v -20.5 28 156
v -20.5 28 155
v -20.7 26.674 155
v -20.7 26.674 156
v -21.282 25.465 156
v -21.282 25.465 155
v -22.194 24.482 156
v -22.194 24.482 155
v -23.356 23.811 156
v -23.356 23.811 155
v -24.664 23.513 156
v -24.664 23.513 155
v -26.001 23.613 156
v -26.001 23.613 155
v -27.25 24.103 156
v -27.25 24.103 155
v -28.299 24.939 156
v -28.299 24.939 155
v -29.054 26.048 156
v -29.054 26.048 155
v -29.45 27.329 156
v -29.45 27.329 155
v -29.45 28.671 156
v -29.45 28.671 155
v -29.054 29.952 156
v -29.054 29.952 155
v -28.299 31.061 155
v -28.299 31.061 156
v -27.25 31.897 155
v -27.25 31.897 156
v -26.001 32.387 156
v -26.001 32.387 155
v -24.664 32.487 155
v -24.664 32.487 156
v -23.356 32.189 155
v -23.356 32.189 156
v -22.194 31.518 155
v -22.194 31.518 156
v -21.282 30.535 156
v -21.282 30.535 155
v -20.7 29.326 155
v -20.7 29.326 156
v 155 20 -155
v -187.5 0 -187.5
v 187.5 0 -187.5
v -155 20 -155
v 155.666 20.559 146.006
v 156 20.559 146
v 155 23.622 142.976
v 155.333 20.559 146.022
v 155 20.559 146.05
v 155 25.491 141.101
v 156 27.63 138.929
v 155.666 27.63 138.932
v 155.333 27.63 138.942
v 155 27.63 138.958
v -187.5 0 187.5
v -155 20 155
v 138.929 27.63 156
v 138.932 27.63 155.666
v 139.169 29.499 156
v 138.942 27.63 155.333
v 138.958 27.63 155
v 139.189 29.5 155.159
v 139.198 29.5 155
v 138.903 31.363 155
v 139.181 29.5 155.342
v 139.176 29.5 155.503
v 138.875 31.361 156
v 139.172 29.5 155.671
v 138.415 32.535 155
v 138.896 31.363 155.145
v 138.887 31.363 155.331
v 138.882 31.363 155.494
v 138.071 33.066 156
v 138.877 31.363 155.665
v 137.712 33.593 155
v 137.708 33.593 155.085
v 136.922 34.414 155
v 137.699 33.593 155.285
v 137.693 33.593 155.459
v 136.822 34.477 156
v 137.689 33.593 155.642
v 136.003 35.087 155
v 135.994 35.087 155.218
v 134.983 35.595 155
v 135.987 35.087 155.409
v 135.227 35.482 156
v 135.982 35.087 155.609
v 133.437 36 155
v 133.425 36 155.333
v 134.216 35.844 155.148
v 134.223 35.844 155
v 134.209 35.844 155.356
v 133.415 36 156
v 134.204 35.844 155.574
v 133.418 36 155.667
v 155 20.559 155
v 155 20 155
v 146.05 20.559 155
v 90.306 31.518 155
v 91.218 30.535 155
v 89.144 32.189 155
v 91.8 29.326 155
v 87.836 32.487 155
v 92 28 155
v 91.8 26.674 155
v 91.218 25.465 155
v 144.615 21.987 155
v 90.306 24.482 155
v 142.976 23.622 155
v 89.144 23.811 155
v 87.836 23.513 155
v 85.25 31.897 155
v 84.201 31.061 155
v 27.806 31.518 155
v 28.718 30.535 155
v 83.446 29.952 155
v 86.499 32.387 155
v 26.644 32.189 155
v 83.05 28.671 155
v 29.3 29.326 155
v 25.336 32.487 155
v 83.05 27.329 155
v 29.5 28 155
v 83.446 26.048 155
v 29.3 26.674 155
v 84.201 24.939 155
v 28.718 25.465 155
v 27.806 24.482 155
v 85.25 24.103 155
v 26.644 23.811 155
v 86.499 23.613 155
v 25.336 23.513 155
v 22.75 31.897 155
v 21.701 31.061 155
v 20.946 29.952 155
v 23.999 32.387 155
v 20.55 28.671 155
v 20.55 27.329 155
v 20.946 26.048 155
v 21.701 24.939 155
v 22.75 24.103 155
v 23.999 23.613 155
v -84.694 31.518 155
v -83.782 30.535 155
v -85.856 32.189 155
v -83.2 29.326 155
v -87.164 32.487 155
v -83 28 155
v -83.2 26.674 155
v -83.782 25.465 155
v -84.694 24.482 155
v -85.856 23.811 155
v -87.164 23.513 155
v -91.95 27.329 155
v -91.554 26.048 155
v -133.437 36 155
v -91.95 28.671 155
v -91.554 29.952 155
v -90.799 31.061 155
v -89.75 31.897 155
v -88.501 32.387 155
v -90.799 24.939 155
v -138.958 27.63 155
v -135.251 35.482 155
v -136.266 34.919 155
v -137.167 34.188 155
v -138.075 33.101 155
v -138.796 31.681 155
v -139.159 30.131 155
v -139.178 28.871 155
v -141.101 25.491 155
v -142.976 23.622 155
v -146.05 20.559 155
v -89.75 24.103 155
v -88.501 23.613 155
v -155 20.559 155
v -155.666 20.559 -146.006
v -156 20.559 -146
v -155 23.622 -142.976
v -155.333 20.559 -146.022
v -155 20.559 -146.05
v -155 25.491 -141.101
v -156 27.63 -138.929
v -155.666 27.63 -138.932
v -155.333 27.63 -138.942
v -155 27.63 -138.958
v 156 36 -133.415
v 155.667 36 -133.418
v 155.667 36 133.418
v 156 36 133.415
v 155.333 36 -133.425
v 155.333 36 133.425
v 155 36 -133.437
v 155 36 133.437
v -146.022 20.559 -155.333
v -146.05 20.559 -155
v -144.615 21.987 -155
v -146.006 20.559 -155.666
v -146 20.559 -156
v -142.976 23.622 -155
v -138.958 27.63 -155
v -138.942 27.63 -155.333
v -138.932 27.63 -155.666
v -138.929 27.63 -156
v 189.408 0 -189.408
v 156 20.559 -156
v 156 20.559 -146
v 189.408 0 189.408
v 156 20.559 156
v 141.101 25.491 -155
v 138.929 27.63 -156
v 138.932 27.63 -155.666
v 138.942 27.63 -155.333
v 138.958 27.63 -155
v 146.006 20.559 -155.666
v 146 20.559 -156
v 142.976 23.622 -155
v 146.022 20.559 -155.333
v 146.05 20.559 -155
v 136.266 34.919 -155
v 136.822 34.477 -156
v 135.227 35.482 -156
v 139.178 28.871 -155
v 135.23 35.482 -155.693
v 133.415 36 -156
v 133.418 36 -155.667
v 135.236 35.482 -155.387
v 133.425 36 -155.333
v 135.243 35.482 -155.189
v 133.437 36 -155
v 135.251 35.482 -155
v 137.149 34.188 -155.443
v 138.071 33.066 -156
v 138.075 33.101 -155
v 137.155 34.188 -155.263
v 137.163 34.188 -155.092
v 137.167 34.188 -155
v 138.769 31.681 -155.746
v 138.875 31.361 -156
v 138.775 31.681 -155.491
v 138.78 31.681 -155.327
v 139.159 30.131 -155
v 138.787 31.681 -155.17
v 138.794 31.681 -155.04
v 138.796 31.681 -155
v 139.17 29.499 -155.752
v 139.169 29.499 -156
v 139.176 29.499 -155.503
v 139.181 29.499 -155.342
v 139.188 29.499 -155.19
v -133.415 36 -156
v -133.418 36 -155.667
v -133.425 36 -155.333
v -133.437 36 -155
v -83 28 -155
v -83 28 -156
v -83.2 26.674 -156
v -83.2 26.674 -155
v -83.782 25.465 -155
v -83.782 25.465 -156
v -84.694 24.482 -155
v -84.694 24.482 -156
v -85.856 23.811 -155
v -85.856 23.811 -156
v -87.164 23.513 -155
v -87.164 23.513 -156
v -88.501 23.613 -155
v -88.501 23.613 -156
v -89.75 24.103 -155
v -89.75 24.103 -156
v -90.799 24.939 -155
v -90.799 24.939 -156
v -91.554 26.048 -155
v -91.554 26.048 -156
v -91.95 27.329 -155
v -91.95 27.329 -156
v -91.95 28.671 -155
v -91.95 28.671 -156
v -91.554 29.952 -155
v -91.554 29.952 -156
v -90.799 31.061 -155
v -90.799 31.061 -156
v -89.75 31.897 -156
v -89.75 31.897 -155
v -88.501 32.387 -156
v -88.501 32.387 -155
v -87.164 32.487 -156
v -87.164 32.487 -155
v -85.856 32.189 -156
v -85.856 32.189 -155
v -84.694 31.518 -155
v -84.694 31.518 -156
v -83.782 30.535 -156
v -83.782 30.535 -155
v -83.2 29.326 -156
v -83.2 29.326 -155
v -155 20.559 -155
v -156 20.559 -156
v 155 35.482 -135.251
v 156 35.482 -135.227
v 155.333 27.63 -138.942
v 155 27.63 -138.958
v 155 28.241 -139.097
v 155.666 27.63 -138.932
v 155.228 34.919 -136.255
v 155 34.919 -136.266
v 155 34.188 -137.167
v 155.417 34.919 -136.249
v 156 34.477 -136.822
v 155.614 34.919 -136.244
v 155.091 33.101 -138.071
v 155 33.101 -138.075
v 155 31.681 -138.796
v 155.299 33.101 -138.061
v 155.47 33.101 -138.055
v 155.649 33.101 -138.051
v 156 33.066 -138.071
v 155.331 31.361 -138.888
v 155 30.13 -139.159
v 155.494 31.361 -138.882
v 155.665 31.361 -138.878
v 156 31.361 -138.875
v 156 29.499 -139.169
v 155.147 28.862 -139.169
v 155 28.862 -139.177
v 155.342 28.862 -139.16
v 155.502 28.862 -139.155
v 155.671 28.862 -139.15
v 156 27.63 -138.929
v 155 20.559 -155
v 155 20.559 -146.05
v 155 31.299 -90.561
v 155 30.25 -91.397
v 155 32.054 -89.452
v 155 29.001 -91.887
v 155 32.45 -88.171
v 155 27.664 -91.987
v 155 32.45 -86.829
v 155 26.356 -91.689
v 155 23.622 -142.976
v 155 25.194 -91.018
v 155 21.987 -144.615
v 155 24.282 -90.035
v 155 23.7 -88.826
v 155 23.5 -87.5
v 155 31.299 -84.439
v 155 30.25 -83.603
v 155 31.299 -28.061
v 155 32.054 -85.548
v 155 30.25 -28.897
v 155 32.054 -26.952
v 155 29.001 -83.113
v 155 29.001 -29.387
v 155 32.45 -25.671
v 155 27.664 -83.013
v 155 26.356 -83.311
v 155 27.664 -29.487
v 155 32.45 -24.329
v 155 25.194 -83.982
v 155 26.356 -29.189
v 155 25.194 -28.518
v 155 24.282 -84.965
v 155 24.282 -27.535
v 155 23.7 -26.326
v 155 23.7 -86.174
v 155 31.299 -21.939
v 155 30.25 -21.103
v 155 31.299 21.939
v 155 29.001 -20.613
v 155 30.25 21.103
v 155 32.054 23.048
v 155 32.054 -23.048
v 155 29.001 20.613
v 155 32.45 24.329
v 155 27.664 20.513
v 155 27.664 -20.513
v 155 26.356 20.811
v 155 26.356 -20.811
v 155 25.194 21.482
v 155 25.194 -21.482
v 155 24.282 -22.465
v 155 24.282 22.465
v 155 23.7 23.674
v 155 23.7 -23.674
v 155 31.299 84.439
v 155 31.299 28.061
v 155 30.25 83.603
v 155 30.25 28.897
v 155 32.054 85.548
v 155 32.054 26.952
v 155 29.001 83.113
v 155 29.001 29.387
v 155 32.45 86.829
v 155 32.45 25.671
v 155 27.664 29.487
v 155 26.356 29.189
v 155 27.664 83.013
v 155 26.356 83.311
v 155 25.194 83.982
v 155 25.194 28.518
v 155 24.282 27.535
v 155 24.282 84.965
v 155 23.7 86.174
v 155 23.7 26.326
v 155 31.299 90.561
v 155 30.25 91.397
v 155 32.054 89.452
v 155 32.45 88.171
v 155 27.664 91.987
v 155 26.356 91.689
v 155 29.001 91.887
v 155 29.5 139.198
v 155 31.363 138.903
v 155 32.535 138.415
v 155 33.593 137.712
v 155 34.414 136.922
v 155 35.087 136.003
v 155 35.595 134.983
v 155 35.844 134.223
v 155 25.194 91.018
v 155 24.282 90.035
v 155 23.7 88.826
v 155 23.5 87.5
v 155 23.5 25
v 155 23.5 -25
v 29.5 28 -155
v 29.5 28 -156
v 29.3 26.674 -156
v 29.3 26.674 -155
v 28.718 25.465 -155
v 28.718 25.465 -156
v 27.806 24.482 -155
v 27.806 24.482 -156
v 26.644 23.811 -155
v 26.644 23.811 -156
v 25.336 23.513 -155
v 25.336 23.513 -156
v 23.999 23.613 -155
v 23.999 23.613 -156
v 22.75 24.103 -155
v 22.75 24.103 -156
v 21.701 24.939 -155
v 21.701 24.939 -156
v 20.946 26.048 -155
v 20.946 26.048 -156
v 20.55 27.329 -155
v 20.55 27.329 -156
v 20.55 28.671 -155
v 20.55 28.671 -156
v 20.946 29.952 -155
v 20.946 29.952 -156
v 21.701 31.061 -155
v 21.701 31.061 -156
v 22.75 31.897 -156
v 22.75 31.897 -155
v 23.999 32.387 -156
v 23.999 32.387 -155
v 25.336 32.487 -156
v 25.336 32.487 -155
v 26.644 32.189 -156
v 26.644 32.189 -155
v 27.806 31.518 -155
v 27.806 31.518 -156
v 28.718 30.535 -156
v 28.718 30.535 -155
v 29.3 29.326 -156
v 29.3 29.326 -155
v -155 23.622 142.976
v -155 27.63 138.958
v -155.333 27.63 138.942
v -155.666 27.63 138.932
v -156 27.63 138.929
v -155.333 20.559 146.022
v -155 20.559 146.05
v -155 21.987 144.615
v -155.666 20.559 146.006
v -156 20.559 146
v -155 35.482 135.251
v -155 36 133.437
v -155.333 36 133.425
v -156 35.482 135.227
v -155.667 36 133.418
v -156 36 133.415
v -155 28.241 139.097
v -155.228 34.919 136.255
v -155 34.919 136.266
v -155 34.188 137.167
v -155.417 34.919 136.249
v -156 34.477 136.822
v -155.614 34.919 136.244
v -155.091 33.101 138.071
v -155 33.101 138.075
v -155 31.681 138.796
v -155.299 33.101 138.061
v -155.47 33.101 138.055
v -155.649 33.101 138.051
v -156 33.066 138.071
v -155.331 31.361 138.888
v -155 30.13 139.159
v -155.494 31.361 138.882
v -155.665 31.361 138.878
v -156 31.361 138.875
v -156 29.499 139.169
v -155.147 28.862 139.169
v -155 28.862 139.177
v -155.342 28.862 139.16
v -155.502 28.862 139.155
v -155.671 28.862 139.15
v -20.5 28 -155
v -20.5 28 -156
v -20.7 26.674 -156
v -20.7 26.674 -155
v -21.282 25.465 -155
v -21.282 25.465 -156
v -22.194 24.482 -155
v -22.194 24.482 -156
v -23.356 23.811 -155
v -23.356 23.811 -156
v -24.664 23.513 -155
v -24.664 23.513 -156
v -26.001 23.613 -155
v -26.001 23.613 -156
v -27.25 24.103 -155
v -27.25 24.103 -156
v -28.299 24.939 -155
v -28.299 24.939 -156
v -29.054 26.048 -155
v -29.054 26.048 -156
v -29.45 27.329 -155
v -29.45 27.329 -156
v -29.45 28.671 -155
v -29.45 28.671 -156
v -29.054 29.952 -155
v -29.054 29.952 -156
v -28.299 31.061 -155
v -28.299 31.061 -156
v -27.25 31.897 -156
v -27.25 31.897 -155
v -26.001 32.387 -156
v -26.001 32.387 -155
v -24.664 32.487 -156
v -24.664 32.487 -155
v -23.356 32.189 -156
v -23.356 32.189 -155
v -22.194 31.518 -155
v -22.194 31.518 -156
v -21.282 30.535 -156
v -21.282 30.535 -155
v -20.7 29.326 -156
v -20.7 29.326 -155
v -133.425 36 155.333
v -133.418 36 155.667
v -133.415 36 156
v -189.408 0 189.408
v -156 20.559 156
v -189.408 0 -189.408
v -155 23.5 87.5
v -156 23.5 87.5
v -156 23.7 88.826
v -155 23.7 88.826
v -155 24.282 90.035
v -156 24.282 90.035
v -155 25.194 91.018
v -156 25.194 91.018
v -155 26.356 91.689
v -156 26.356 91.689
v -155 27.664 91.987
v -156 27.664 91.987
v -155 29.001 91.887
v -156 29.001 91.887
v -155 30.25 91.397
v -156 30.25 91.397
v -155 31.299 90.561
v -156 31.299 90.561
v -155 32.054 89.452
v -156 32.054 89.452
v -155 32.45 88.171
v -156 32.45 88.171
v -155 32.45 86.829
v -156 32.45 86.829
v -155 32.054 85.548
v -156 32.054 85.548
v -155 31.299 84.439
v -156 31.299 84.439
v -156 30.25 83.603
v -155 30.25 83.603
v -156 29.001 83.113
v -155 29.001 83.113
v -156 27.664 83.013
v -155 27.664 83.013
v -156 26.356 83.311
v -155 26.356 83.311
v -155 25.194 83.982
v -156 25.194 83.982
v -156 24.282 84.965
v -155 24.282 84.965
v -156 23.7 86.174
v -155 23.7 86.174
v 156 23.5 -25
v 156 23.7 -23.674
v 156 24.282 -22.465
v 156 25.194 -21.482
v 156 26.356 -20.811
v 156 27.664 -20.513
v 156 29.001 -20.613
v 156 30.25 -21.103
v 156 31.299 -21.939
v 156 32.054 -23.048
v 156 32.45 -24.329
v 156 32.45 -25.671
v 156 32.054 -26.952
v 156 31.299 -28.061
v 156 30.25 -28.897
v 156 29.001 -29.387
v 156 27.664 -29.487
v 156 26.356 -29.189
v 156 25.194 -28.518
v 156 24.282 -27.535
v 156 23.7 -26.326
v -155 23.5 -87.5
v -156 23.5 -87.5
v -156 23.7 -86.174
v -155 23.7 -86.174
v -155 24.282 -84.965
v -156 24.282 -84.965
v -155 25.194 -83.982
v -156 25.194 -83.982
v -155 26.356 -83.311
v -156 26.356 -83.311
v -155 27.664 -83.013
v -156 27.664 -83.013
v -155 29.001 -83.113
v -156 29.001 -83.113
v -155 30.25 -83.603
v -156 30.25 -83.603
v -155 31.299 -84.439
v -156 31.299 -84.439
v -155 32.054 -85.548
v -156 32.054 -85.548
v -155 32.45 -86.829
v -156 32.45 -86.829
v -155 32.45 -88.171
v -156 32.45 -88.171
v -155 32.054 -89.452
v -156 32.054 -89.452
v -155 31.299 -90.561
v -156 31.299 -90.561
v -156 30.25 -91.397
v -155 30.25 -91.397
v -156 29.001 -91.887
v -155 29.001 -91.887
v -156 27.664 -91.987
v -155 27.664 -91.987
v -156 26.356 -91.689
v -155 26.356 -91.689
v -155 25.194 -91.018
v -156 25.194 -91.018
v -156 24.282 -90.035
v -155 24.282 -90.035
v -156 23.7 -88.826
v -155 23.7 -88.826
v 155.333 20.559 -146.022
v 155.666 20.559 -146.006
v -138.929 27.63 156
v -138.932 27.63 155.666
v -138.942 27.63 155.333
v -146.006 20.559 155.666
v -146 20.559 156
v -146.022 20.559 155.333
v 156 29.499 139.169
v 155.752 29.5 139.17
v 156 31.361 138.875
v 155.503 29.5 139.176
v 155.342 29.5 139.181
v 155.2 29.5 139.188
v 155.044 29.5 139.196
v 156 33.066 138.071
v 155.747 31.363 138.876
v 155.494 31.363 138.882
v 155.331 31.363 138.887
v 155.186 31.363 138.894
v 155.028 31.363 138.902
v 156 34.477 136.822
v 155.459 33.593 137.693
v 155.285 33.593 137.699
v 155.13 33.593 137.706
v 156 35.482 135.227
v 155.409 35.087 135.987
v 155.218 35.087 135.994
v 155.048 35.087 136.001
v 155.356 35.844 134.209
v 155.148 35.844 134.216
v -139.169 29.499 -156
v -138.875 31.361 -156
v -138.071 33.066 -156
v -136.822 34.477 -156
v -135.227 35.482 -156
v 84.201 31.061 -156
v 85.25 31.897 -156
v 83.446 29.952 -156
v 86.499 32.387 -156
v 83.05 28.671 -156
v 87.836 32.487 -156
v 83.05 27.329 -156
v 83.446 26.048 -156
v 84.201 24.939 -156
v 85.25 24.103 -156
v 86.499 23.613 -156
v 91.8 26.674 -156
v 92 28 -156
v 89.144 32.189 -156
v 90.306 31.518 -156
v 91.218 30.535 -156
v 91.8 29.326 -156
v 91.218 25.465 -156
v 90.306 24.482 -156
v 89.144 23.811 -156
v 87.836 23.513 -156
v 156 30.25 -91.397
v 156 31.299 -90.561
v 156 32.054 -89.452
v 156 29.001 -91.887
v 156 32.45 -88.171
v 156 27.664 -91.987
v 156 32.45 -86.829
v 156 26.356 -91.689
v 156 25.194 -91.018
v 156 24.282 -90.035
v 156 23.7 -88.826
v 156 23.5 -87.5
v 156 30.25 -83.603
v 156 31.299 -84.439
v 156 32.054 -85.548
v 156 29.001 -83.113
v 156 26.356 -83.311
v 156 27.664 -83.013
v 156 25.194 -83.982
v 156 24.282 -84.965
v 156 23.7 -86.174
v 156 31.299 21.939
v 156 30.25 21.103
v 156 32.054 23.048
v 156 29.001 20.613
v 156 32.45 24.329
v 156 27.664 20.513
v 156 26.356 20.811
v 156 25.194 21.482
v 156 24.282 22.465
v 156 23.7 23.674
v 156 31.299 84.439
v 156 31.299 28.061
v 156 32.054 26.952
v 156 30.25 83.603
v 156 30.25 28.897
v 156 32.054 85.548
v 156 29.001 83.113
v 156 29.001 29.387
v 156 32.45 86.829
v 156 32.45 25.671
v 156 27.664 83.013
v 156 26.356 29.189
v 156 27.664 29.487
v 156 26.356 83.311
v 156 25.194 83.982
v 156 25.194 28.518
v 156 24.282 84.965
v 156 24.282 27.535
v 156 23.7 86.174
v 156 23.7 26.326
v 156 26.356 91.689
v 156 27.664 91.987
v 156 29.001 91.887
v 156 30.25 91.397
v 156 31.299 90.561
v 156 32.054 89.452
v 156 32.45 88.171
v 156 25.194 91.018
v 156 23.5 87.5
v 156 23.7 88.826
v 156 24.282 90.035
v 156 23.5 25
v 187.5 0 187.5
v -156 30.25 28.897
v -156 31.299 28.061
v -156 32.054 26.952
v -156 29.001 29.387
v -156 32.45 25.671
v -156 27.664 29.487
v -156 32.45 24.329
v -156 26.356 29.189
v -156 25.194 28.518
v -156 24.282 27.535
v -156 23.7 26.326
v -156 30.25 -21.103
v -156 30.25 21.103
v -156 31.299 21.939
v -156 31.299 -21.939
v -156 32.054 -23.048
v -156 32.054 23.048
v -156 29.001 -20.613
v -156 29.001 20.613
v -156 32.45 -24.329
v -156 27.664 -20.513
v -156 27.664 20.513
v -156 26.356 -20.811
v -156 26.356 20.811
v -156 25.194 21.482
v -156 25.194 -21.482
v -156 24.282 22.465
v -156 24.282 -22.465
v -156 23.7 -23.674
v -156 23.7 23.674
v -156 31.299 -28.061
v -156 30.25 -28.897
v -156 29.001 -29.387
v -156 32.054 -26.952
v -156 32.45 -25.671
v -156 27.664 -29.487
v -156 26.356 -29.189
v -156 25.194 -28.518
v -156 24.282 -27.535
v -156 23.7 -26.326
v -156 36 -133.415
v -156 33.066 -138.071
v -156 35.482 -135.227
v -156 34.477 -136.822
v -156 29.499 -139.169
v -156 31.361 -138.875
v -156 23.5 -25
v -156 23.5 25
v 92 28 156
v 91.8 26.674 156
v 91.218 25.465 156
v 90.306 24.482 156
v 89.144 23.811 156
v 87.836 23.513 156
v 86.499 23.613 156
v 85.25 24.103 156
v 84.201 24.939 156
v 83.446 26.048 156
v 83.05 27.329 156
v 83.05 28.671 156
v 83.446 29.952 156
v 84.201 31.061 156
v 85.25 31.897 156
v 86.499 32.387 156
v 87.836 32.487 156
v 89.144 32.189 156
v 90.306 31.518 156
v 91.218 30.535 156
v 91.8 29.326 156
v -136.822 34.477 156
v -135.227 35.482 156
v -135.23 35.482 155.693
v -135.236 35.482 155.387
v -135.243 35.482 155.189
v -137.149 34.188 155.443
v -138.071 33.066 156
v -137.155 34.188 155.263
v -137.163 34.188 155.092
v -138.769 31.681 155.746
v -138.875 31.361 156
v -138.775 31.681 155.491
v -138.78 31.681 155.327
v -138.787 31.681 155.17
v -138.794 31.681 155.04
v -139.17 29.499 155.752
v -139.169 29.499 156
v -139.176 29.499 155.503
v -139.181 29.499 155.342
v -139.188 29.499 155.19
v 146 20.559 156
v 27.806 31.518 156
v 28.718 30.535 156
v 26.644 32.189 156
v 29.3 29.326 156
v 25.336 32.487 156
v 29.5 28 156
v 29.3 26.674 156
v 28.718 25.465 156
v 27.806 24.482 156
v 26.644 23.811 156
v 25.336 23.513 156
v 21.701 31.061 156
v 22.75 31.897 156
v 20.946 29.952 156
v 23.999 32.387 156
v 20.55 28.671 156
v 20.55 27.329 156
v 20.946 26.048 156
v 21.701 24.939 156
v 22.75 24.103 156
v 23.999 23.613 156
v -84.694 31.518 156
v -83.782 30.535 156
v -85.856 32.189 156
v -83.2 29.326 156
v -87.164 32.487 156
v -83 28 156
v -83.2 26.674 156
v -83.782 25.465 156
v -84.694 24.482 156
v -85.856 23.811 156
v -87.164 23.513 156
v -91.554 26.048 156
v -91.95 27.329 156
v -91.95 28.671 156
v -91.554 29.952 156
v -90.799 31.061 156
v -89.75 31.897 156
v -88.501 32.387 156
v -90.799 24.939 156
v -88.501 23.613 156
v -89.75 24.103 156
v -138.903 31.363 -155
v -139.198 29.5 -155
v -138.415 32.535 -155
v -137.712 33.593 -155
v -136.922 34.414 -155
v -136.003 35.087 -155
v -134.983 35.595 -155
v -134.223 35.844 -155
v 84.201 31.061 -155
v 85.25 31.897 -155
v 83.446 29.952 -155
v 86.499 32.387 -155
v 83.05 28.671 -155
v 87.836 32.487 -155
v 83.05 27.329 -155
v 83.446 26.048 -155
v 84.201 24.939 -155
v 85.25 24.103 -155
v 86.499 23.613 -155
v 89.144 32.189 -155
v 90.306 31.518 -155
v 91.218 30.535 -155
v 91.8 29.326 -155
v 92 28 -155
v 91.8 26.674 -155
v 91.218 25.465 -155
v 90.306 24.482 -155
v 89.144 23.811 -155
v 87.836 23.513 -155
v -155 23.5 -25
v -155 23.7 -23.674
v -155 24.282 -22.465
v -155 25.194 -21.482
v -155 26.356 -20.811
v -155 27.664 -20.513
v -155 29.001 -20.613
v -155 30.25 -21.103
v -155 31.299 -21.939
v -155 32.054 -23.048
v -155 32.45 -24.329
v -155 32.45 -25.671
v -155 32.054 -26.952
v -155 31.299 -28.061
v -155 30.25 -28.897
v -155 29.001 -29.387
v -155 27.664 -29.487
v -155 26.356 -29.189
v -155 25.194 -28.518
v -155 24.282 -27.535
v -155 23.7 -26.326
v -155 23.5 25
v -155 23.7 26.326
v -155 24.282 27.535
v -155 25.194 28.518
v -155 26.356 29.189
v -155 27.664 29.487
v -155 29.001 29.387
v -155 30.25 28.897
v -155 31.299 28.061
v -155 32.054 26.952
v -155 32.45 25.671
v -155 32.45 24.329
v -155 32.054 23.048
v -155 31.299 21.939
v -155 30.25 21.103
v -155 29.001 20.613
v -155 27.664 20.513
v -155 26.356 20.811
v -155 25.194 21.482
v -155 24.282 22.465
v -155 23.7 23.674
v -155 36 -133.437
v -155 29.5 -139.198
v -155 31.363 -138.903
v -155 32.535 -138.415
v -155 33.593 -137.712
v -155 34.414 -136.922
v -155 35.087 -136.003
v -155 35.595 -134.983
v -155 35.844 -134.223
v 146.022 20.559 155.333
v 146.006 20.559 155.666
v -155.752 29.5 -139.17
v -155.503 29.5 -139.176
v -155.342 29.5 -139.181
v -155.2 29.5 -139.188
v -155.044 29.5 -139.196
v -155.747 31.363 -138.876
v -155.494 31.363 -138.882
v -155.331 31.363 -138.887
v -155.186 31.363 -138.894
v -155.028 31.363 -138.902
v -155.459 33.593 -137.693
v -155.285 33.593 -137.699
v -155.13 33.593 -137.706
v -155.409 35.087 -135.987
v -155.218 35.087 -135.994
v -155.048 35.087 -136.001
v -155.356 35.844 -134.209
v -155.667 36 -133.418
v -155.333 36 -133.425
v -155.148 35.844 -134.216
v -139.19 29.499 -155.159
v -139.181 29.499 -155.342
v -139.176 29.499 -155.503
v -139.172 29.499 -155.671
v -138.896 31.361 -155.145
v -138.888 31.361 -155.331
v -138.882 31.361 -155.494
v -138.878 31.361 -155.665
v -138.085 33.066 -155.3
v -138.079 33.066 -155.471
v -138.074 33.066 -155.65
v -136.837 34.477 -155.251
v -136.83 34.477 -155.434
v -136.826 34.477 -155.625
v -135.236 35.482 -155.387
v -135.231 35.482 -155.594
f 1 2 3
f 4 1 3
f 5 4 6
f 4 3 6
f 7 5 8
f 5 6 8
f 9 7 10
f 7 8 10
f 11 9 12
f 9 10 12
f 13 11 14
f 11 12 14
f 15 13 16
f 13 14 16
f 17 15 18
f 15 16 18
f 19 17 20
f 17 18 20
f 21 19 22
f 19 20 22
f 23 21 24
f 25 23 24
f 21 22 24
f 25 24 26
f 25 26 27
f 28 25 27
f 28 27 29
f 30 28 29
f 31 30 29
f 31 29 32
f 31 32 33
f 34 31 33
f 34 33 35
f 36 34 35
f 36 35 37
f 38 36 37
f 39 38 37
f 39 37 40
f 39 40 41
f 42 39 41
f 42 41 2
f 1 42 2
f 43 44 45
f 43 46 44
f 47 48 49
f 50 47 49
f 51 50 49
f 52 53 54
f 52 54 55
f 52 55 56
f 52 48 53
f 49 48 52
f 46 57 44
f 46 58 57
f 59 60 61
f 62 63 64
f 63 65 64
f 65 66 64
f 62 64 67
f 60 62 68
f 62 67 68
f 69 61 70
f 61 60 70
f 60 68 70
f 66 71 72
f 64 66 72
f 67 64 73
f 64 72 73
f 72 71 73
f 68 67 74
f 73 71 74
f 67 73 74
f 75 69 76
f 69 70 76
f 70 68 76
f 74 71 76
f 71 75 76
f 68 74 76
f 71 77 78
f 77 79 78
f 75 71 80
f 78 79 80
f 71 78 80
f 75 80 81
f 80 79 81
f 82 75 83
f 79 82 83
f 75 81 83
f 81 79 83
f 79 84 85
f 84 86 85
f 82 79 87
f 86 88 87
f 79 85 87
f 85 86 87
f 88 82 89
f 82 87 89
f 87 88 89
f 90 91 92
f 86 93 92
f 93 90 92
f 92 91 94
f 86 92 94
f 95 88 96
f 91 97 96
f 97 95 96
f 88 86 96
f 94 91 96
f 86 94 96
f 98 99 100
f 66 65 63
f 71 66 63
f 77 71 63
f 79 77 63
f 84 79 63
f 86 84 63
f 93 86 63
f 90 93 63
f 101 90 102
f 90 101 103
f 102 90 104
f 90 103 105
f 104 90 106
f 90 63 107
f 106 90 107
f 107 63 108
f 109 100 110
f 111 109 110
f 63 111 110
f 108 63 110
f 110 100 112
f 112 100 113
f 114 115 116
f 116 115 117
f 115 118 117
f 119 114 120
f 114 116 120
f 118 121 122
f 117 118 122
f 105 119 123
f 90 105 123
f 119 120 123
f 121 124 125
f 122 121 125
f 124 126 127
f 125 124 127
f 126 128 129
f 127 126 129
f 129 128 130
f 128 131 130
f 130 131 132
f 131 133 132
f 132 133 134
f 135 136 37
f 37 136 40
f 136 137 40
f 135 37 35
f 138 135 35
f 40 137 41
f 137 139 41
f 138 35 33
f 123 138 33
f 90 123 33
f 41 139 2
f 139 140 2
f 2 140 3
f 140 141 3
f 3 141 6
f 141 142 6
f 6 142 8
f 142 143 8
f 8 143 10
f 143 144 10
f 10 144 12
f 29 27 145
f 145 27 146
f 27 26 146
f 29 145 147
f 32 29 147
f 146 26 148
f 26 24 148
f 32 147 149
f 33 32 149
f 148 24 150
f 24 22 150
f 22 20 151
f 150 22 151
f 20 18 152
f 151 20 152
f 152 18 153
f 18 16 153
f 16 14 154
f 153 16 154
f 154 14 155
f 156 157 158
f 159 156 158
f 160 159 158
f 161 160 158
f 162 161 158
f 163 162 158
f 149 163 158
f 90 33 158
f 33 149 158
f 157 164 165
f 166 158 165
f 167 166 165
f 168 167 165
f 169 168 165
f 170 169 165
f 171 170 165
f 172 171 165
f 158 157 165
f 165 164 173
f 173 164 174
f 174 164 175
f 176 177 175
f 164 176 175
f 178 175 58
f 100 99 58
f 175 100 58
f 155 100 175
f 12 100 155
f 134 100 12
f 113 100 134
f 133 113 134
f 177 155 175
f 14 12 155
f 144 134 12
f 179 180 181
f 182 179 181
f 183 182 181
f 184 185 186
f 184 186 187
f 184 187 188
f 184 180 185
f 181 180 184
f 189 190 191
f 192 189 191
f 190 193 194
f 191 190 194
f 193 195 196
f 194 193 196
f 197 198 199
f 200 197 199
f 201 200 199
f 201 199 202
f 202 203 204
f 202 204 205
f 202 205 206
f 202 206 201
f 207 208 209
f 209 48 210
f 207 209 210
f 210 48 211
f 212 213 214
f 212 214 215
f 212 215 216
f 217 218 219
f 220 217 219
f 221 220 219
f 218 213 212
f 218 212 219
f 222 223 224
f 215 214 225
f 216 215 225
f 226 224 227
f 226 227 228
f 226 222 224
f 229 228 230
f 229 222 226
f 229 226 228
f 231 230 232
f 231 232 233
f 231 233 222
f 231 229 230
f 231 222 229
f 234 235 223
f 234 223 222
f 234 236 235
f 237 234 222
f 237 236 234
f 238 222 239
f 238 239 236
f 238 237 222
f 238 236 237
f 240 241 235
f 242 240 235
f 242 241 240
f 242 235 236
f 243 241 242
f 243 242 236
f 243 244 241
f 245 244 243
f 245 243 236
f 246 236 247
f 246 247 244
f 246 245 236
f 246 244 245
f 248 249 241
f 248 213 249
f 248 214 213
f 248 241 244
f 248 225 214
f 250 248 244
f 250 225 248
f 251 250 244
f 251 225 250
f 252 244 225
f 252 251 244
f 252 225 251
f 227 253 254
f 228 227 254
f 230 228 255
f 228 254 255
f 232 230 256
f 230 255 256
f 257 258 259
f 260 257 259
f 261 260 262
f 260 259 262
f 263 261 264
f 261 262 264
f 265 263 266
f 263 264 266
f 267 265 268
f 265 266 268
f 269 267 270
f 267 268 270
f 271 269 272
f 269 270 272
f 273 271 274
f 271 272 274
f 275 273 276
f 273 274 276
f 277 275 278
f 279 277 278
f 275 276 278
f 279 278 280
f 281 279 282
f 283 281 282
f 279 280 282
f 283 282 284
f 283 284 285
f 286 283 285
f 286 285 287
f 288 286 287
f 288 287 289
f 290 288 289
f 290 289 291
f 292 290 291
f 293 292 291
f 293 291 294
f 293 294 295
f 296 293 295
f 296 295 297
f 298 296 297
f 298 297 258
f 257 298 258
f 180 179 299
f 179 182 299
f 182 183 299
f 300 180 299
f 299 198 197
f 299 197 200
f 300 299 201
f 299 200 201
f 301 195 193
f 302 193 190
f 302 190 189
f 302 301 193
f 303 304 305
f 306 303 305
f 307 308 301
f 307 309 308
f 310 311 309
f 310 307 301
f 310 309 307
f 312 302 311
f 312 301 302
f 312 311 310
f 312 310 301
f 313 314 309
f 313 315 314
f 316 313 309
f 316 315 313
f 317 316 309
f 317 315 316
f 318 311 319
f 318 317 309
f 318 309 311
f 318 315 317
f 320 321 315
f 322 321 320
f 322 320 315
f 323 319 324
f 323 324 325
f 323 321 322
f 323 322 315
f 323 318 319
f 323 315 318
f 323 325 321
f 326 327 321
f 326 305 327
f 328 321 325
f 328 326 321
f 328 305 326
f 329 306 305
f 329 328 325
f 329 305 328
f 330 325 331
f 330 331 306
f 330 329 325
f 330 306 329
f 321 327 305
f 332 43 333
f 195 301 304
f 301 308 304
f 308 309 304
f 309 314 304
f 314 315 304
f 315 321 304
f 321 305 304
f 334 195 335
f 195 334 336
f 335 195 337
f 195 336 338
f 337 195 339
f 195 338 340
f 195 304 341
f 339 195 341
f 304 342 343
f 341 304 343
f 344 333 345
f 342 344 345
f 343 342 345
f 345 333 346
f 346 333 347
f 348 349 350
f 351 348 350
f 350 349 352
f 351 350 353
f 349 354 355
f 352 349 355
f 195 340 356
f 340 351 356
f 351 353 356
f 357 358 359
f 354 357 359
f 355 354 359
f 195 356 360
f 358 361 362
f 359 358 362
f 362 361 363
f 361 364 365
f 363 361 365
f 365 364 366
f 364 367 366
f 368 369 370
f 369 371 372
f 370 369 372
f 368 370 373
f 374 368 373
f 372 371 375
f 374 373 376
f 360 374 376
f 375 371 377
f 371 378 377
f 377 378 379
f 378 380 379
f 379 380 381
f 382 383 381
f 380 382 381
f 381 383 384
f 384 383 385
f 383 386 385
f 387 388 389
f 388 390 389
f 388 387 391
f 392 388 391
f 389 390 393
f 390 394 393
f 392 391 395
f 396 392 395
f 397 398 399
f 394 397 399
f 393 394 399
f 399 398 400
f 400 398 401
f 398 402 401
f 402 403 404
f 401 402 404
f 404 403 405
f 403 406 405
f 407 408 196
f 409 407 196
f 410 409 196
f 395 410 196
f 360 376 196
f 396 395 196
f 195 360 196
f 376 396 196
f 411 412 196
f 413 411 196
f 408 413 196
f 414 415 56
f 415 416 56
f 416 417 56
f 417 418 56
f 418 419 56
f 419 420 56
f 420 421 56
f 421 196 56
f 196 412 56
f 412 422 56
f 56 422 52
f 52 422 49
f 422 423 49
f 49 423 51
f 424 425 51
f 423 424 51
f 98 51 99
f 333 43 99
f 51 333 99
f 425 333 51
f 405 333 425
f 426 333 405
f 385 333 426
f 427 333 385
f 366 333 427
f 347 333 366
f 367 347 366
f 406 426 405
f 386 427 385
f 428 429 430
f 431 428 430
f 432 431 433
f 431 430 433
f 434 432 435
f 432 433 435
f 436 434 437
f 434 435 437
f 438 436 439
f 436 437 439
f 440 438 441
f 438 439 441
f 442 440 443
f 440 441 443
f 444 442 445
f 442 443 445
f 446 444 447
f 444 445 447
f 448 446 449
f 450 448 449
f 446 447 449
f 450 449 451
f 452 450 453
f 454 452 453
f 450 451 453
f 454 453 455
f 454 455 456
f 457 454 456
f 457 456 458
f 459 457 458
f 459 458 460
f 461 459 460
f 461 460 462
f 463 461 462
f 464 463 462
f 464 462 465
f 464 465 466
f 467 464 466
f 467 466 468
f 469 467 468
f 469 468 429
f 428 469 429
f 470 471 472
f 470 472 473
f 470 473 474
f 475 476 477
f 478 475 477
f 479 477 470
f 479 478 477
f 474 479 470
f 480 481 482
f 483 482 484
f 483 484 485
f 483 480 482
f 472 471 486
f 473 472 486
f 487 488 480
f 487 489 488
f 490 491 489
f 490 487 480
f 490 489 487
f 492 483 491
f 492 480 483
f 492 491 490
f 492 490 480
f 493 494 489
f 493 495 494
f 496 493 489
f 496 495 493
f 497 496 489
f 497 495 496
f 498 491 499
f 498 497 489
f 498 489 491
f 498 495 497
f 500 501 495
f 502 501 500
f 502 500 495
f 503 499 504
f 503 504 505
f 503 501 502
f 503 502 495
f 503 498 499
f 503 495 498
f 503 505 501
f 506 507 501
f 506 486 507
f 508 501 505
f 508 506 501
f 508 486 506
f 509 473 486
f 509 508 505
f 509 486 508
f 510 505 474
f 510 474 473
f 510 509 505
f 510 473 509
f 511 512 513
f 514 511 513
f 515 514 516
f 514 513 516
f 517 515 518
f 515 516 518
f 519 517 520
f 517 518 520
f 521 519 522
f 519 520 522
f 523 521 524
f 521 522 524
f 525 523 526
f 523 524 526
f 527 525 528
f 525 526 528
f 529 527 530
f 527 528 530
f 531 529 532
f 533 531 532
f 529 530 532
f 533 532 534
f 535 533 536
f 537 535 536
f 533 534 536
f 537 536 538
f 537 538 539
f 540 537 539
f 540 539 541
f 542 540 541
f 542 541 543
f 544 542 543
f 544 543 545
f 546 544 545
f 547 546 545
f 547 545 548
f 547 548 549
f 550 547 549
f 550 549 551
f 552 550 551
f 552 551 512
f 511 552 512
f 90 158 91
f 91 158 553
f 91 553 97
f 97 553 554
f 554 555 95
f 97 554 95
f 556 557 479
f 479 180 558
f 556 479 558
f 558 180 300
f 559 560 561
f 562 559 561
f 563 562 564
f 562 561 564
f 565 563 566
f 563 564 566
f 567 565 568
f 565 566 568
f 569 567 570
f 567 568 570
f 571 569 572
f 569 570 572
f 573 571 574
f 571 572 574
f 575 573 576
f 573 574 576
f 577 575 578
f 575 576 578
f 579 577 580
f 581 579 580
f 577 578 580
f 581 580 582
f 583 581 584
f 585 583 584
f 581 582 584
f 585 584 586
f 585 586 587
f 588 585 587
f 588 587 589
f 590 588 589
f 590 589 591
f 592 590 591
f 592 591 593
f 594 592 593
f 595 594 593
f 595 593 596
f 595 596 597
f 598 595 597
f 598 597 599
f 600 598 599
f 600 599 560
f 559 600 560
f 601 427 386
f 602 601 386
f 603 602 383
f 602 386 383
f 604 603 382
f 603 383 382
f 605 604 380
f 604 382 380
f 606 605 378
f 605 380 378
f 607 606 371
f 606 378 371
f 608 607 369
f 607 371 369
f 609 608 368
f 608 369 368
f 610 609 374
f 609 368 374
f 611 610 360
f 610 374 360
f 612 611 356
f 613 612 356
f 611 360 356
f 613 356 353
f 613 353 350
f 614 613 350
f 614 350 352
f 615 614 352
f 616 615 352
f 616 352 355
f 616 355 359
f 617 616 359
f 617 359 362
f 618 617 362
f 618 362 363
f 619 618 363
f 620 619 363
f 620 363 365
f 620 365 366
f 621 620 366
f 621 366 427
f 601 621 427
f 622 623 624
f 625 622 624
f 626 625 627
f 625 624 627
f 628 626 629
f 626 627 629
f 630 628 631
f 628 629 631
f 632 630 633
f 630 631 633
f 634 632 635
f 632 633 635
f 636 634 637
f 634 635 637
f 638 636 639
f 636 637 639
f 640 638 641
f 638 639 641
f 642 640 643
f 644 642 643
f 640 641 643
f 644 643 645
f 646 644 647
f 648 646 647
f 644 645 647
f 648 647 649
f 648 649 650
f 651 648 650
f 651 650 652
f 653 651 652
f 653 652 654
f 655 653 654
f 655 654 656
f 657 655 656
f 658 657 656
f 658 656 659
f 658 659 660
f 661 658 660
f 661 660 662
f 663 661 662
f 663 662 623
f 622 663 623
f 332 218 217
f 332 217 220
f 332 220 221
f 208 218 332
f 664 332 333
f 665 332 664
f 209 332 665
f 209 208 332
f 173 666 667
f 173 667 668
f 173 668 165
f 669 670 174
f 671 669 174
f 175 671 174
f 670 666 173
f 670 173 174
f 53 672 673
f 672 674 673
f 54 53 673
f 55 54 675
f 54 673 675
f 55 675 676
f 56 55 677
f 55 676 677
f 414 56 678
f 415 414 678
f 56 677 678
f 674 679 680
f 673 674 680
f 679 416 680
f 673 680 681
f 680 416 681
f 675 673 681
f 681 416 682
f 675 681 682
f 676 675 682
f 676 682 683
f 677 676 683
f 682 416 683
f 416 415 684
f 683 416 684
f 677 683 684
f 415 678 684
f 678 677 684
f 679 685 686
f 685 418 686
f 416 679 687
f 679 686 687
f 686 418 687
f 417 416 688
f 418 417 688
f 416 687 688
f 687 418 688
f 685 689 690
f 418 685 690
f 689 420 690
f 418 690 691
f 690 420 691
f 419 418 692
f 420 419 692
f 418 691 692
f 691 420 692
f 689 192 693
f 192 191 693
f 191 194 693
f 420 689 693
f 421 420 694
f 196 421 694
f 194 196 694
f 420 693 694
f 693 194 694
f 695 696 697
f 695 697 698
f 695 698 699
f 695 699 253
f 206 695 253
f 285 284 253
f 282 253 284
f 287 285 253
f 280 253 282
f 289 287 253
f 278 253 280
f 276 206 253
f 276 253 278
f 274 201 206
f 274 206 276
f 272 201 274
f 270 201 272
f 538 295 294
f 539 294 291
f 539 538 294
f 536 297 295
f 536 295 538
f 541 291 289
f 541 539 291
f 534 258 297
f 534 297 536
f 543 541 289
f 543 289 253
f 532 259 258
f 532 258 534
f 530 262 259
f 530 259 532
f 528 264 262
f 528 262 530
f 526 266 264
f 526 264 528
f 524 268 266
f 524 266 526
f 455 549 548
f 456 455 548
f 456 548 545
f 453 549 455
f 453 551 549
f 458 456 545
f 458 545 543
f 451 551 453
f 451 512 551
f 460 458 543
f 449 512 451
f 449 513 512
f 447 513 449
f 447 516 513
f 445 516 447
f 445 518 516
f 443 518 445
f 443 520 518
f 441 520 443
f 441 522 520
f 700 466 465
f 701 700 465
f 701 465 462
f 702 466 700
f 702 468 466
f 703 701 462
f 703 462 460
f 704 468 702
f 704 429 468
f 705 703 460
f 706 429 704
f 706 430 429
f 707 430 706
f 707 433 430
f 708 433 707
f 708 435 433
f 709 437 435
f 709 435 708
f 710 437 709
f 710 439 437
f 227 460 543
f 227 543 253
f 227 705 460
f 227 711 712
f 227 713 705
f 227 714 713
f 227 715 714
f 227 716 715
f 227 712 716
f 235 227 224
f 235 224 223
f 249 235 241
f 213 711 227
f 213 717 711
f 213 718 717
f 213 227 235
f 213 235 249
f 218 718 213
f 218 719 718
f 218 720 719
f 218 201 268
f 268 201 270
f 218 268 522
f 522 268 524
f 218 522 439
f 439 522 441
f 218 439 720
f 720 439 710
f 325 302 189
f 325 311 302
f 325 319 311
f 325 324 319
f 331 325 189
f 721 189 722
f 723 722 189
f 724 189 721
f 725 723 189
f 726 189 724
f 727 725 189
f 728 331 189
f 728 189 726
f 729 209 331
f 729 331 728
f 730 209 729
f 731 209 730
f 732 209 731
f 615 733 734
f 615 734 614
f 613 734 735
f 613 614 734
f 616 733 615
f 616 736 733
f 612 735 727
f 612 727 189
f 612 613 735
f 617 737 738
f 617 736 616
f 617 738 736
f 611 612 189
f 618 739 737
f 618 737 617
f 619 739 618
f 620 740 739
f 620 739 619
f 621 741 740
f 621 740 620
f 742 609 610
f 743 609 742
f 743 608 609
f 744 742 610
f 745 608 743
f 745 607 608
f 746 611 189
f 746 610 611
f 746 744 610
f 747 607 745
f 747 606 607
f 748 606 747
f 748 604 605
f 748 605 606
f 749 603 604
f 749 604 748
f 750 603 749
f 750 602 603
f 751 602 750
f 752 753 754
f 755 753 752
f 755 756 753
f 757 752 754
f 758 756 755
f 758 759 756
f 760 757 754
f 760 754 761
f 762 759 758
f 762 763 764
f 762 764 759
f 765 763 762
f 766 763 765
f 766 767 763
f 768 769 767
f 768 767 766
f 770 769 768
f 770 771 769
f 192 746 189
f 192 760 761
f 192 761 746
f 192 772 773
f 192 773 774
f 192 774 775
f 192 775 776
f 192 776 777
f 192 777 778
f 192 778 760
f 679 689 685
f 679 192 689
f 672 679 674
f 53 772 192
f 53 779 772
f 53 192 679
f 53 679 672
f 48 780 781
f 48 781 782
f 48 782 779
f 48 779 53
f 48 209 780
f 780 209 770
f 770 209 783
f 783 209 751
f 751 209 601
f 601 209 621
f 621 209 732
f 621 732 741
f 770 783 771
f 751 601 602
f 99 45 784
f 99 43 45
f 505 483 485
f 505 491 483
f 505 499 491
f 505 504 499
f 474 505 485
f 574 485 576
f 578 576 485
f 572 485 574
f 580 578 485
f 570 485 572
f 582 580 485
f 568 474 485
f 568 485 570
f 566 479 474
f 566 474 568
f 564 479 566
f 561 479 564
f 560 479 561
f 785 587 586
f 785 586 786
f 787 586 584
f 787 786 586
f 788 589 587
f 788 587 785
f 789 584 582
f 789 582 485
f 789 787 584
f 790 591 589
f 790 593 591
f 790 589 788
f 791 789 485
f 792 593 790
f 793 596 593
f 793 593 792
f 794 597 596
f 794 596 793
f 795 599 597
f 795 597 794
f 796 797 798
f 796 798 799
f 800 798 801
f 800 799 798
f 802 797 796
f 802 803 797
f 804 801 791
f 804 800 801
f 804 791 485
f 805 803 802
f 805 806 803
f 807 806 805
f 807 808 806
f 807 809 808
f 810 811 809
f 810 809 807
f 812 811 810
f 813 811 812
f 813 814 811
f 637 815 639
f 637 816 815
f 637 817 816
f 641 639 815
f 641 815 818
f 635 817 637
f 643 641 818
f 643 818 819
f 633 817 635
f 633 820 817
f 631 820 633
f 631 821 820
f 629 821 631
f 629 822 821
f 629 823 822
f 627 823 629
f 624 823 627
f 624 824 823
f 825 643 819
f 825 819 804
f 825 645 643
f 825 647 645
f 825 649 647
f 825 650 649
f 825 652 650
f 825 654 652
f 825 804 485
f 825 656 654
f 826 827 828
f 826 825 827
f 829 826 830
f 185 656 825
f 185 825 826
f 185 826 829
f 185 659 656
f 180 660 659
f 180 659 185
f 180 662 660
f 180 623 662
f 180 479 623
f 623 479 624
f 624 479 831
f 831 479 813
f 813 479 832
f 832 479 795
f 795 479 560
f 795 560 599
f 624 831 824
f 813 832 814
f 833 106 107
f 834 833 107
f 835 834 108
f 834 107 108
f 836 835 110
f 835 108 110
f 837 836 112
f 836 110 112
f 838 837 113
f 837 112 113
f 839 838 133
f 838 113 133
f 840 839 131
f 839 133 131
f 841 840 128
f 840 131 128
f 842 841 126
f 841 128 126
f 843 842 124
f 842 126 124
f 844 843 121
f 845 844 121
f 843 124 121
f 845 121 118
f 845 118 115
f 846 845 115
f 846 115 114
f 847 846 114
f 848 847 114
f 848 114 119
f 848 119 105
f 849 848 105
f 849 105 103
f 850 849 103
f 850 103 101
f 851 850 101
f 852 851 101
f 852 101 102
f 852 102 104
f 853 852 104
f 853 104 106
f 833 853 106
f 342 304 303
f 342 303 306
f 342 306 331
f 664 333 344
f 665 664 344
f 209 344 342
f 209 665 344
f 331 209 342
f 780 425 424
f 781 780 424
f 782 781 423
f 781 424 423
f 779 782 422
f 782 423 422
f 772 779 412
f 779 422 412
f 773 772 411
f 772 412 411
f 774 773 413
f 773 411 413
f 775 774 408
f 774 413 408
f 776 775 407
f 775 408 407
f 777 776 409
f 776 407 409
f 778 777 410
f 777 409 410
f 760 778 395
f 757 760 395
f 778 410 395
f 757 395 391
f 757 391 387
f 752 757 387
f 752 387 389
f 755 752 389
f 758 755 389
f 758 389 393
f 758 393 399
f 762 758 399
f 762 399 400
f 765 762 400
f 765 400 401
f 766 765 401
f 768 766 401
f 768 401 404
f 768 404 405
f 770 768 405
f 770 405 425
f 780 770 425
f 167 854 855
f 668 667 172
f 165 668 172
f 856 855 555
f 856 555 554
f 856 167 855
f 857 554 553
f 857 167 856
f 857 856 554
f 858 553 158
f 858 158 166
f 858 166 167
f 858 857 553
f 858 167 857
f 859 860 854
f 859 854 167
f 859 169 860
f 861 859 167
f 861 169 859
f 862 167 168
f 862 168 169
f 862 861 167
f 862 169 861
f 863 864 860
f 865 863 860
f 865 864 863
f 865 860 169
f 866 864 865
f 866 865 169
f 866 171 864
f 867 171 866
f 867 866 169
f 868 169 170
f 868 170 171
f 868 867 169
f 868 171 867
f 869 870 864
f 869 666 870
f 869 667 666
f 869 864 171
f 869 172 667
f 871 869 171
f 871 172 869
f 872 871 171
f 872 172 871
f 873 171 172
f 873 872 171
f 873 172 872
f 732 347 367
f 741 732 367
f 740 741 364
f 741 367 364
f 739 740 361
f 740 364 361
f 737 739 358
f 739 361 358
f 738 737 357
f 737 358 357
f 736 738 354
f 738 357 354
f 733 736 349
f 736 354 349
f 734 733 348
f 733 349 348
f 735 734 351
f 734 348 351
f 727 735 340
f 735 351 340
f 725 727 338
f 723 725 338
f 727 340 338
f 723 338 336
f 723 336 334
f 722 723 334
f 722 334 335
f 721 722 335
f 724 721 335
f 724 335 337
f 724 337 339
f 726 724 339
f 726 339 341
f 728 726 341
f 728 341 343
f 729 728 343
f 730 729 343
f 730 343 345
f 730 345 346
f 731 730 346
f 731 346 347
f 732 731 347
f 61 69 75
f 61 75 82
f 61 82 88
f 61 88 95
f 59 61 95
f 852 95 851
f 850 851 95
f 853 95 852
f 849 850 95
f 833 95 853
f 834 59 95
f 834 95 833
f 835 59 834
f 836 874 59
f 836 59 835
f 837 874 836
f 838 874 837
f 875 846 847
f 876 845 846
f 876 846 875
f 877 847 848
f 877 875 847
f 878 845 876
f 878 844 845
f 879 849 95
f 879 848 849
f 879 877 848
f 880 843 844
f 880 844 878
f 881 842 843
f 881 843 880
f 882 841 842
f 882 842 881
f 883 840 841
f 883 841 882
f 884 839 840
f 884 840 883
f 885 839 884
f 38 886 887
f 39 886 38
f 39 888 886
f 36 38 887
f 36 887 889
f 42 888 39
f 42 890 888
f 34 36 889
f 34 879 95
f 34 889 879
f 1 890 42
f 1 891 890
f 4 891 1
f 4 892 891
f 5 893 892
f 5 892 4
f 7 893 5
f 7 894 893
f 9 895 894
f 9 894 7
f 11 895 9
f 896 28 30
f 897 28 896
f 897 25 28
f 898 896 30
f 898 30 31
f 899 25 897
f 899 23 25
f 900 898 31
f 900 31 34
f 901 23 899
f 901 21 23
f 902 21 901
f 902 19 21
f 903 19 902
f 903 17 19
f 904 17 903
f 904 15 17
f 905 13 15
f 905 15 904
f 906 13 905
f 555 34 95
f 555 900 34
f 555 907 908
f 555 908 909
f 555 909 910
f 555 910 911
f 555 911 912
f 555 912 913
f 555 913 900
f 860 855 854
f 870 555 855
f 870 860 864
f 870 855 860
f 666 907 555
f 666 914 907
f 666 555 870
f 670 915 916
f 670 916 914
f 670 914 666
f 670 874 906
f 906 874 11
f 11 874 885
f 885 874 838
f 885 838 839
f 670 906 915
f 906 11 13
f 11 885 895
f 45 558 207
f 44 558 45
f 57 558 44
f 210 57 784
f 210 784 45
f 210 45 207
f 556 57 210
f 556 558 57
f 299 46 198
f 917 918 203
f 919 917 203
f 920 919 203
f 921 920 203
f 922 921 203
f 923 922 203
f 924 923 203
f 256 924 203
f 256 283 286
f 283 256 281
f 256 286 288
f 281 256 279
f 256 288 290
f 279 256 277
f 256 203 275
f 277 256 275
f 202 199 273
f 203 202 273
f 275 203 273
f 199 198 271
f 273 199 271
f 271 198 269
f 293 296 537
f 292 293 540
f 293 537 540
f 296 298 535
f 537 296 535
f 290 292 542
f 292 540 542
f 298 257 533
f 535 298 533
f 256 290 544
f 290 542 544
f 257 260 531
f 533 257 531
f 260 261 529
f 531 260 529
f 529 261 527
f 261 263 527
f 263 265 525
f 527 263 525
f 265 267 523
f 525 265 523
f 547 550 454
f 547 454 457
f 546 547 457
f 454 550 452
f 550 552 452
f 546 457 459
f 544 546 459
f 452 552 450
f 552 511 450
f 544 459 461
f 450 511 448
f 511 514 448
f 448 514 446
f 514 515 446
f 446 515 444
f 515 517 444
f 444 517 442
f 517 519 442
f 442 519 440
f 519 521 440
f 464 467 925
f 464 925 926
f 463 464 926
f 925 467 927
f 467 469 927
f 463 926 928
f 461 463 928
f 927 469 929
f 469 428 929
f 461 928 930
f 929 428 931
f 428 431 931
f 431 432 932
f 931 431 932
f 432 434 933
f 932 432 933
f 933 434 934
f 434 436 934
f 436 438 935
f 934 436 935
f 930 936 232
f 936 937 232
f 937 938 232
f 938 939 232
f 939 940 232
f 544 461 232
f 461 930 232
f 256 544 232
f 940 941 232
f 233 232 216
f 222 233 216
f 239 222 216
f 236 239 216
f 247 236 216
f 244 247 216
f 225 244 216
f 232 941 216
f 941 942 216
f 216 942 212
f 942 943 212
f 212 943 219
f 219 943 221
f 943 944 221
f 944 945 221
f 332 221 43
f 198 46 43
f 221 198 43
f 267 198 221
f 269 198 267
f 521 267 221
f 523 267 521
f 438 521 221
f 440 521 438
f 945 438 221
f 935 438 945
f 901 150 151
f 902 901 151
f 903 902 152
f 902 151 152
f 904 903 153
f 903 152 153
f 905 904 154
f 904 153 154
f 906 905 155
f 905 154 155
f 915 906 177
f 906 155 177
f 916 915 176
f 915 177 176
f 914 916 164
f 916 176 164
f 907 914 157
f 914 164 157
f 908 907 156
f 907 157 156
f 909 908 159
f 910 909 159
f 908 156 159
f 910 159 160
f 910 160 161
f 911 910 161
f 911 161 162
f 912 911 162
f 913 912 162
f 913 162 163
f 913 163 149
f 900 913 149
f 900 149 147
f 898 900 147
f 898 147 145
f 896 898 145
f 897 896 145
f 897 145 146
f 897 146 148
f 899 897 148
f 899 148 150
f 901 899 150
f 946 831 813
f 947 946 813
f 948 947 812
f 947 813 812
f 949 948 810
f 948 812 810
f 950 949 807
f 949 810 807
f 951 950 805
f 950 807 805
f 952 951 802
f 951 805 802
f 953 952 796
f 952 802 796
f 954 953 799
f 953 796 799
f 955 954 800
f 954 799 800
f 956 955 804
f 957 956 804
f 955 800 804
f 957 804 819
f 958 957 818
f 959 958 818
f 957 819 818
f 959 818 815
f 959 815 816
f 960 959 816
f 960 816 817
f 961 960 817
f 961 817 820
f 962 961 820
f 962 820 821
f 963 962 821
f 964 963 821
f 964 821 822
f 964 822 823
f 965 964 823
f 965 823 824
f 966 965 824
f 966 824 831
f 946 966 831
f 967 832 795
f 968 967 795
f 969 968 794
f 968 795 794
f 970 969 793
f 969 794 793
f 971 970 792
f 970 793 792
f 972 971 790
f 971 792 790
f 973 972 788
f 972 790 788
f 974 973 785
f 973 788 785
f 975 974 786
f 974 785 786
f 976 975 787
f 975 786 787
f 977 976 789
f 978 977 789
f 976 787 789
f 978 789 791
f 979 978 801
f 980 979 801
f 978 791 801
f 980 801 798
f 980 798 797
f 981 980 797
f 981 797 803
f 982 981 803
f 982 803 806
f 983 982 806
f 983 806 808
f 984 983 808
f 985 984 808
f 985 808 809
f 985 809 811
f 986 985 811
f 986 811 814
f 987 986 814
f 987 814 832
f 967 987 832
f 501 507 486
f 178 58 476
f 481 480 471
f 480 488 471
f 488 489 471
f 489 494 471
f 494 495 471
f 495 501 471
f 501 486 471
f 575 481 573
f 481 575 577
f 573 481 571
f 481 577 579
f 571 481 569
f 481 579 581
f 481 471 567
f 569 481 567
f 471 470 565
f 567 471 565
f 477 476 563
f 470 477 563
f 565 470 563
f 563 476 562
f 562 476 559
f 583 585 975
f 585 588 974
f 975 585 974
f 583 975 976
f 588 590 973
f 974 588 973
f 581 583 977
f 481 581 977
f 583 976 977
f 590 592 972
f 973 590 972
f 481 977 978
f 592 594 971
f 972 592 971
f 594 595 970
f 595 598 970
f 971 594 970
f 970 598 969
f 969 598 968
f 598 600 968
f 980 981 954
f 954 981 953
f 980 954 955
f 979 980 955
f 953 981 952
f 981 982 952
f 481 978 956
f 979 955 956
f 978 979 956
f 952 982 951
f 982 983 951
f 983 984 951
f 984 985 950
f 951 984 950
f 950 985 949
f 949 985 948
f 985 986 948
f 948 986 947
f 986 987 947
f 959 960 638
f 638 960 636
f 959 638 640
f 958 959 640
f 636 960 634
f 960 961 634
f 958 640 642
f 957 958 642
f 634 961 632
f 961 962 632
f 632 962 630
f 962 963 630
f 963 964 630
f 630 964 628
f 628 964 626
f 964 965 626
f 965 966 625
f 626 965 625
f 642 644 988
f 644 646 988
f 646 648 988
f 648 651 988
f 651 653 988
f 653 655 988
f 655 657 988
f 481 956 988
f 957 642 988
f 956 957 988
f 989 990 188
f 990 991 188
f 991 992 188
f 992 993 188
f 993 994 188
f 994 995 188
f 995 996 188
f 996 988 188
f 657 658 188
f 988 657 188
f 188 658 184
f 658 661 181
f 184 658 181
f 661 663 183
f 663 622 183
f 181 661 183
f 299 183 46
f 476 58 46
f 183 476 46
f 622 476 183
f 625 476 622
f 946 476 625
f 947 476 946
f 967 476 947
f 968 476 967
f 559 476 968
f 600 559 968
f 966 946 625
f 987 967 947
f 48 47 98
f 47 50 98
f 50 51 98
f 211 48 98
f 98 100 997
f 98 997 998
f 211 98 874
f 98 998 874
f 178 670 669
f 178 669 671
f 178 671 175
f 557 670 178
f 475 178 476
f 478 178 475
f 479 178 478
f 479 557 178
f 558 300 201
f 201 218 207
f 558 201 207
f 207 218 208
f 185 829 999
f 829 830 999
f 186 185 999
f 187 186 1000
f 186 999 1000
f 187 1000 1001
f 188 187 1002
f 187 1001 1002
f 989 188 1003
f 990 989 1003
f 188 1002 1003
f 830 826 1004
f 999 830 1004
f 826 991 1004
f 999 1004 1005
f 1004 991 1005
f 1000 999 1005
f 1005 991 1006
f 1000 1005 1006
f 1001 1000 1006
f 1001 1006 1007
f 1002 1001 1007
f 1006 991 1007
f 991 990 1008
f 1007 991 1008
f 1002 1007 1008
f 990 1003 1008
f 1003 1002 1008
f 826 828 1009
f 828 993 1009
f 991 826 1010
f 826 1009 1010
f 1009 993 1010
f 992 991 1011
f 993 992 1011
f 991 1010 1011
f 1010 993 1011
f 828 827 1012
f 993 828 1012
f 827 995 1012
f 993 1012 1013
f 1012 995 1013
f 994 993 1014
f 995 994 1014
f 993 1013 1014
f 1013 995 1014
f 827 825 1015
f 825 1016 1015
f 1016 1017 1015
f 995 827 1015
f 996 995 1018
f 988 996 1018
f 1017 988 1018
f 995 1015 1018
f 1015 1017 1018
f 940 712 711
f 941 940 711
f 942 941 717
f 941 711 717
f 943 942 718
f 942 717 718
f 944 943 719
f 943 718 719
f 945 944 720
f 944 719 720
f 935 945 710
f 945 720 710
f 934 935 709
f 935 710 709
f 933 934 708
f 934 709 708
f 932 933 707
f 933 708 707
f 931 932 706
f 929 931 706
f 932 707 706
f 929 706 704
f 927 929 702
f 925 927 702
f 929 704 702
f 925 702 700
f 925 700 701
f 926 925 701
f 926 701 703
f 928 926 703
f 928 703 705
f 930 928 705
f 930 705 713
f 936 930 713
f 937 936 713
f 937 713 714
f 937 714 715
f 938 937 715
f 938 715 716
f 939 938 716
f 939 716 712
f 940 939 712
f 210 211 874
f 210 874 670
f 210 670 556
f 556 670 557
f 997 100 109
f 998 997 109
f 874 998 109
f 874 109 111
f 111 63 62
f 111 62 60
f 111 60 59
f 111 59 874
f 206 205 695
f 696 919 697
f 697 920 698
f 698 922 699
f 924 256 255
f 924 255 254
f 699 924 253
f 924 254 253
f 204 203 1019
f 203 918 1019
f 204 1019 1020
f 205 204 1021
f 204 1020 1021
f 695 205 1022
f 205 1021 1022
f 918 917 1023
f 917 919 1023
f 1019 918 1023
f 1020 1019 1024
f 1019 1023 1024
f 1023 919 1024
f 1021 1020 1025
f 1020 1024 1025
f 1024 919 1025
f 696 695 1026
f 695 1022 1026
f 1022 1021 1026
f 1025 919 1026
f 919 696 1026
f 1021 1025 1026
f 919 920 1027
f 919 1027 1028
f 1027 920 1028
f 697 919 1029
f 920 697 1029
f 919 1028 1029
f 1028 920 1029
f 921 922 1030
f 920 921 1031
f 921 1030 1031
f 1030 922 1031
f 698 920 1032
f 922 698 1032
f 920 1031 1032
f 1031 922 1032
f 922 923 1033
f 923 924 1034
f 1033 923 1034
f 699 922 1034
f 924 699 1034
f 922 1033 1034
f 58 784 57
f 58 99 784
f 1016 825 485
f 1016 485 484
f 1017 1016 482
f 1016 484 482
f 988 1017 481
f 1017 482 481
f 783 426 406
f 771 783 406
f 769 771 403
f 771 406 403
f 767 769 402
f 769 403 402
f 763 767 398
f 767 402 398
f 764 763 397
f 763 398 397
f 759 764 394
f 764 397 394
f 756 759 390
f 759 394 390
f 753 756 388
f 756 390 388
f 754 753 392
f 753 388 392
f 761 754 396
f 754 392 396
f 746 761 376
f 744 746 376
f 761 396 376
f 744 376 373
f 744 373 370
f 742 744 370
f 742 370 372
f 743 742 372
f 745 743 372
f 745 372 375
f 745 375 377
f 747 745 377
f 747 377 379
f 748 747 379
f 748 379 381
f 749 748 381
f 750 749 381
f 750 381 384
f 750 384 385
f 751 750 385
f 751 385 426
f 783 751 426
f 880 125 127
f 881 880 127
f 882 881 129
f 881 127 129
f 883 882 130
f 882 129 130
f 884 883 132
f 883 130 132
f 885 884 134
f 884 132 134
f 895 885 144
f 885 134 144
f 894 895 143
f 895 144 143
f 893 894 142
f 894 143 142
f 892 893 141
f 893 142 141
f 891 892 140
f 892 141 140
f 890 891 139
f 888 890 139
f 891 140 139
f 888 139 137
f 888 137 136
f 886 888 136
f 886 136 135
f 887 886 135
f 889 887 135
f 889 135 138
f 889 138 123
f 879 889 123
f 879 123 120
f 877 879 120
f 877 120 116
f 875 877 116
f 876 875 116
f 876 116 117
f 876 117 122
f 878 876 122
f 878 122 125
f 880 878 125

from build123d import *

# Parameters (mm, degrees)
F0_W      = 375
F0_H      = 375
F2_W      = 310
F2_H      = 310
F5_W      = 310
F5_H      = 310
F3_FACE_W = 310
F3_FACE_H = 310
F7_T      = 1
F14_R     = 4.5
F15_DEPTH = 345.4090421903
F16_R     = 4.5
F17_DEPTH = 345.4090421903


with BuildPart() as f3:
    # F0 (on Front) → F3 section 0
    with BuildSketch(Plane.XZ):
        Rectangle(F0_W, F0_H)
    # F2 (on offset) → F3 section 1
    with BuildSketch(Plane.XZ.offset(-20)):
        Rectangle(F2_W, F2_H)
    loft()

    # F5 (on offset) → F6 section 0
    with BuildSketch(Plane.XZ.offset(-36)):
        Rectangle(F5_W, F5_H)
    # F3_face (on face) → F6 section 1
    with BuildSketch(Plane(origin=(0, 20, 0), x_dir=(-1, 0, 0), z_dir=(0, 1, 0))):
        Rectangle(F3_FACE_W, F3_FACE_H)
    loft()

    # F7
    f7_openings = [f3.faces().sort_by_distance(p)[0] for p in [
        (0, 0, 0),
        (0, 36, 0),
    ]]
    offset(amount=F7_T, openings=f7_openings, kind=Kind.INTERSECTION)

    # F8 (on face) → F9 (revolve, cut)
    with BuildSketch(Plane(origin=(-156, 0, 0), x_dir=(0, -1, 0), z_dir=(-1, 0, 0))):
        with BuildLine():
            Line((-20.558795194, 146), (-20.558795194, 156))
            Line((-20.558795194, 156), (-36, 156))
            Line((-36, 156), (-36, 133.4152411143))
            ThreePointArc((-36, 133.4152411143), (-33.0658481949, 138.0710584905), (-27.6298630059, 138.9289321881))
            Line((-27.6298630059, 138.9289321881), (-20.558795194, 146))
        make_face()
    revolve(axis=Axis((-156, 28.279397597, 156), (0, 1, 0)), mode=Mode.SUBTRACT)

    # F8 (on face) → F10 (revolve, cut)
    with BuildSketch(Plane(origin=(-156, 0, 0), x_dir=(0, -1, 0), z_dir=(-1, 0, 0))):
        with BuildLine():
            Line((-36, -156), (-20.558795194, -156))
            Line((-20.558795194, -156), (-20.558795194, -146))
            Line((-20.558795194, -146), (-27.6298630059, -138.9289321881))
            ThreePointArc((-27.6298630059, -138.9289321881), (-33.0658481949, -138.0710584905), (-36, -133.4152411143))
            Line((-36, -133.4152411143), (-36, -156))
        make_face()
    revolve(axis=Axis((-156, 28.279397597, -156), (0, 1, 0)), mode=Mode.SUBTRACT)

    # F11 (on face) → F12 (revolve, cut)
    with BuildSketch(Plane.YZ.offset(156)):
        with BuildLine():
            Line((27.6298630059, -138.9289321881), (20.558795194, -146))
            Line((20.558795194, -146), (20.558795194, -156))
            Line((20.558795194, -156), (36, -156))
            Line((36, -156), (36, -133.4152411143))
            ThreePointArc((36, -133.4152411143), (33.0658481949, -138.0710584905), (27.6298630059, -138.9289321881))
        make_face()
    revolve(axis=Axis((156, 28.279397597, -156), (0, 1, 0)), mode=Mode.SUBTRACT)

    # F11 (on face) → F13 (revolve, cut)
    with BuildSketch(Plane.YZ.offset(156)):
        with BuildLine():
            Line((36, 156), (20.558795194, 156))
            Line((20.558795194, 156), (20.558795194, 146))
            Line((20.558795194, 146), (27.6298630059, 138.9289321881))
            ThreePointArc((27.6298630059, 138.9289321881), (33.0658481949, 138.0710584905), (36, 133.4152411143))
            Line((36, 133.4152411143), (36, 156))
        make_face()
    revolve(axis=Axis((156, 28.279397597, 156), (0, 1, 0)), mode=Mode.SUBTRACT)

    # F14 (on face) → F15 (cut, through all)
    with BuildSketch(Plane(origin=(0, 0, -156), x_dir=(1, 0, 0), z_dir=(0, 0, -1))):
        with Locations((-25, -28)):
            Circle(F14_R)
        with Locations((25, -28)):
            Circle(F14_R)
        with Locations((-87.5, -28)):
            Circle(F14_R)
        with Locations((87.5, -28)):
            Circle(F14_R)
    extrude(amount=-F15_DEPTH, mode=Mode.SUBTRACT)

    # F16 (on face) → F17 (cut, through all)
    with BuildSketch(Plane(origin=(-156, 0, 0), x_dir=(0, -1, 0), z_dir=(-1, 0, 0))):
        with Locations((-28, 25)):
            Circle(F16_R)
        with Locations((-28, 87.5)):
            Circle(F16_R)
        with Locations((-28, -25)):
            Circle(F16_R)
        with Locations((-28, -87.5)):
            Circle(F16_R)
    extrude(amount=-F17_DEPTH, mode=Mode.SUBTRACT)


solid = f3.part
